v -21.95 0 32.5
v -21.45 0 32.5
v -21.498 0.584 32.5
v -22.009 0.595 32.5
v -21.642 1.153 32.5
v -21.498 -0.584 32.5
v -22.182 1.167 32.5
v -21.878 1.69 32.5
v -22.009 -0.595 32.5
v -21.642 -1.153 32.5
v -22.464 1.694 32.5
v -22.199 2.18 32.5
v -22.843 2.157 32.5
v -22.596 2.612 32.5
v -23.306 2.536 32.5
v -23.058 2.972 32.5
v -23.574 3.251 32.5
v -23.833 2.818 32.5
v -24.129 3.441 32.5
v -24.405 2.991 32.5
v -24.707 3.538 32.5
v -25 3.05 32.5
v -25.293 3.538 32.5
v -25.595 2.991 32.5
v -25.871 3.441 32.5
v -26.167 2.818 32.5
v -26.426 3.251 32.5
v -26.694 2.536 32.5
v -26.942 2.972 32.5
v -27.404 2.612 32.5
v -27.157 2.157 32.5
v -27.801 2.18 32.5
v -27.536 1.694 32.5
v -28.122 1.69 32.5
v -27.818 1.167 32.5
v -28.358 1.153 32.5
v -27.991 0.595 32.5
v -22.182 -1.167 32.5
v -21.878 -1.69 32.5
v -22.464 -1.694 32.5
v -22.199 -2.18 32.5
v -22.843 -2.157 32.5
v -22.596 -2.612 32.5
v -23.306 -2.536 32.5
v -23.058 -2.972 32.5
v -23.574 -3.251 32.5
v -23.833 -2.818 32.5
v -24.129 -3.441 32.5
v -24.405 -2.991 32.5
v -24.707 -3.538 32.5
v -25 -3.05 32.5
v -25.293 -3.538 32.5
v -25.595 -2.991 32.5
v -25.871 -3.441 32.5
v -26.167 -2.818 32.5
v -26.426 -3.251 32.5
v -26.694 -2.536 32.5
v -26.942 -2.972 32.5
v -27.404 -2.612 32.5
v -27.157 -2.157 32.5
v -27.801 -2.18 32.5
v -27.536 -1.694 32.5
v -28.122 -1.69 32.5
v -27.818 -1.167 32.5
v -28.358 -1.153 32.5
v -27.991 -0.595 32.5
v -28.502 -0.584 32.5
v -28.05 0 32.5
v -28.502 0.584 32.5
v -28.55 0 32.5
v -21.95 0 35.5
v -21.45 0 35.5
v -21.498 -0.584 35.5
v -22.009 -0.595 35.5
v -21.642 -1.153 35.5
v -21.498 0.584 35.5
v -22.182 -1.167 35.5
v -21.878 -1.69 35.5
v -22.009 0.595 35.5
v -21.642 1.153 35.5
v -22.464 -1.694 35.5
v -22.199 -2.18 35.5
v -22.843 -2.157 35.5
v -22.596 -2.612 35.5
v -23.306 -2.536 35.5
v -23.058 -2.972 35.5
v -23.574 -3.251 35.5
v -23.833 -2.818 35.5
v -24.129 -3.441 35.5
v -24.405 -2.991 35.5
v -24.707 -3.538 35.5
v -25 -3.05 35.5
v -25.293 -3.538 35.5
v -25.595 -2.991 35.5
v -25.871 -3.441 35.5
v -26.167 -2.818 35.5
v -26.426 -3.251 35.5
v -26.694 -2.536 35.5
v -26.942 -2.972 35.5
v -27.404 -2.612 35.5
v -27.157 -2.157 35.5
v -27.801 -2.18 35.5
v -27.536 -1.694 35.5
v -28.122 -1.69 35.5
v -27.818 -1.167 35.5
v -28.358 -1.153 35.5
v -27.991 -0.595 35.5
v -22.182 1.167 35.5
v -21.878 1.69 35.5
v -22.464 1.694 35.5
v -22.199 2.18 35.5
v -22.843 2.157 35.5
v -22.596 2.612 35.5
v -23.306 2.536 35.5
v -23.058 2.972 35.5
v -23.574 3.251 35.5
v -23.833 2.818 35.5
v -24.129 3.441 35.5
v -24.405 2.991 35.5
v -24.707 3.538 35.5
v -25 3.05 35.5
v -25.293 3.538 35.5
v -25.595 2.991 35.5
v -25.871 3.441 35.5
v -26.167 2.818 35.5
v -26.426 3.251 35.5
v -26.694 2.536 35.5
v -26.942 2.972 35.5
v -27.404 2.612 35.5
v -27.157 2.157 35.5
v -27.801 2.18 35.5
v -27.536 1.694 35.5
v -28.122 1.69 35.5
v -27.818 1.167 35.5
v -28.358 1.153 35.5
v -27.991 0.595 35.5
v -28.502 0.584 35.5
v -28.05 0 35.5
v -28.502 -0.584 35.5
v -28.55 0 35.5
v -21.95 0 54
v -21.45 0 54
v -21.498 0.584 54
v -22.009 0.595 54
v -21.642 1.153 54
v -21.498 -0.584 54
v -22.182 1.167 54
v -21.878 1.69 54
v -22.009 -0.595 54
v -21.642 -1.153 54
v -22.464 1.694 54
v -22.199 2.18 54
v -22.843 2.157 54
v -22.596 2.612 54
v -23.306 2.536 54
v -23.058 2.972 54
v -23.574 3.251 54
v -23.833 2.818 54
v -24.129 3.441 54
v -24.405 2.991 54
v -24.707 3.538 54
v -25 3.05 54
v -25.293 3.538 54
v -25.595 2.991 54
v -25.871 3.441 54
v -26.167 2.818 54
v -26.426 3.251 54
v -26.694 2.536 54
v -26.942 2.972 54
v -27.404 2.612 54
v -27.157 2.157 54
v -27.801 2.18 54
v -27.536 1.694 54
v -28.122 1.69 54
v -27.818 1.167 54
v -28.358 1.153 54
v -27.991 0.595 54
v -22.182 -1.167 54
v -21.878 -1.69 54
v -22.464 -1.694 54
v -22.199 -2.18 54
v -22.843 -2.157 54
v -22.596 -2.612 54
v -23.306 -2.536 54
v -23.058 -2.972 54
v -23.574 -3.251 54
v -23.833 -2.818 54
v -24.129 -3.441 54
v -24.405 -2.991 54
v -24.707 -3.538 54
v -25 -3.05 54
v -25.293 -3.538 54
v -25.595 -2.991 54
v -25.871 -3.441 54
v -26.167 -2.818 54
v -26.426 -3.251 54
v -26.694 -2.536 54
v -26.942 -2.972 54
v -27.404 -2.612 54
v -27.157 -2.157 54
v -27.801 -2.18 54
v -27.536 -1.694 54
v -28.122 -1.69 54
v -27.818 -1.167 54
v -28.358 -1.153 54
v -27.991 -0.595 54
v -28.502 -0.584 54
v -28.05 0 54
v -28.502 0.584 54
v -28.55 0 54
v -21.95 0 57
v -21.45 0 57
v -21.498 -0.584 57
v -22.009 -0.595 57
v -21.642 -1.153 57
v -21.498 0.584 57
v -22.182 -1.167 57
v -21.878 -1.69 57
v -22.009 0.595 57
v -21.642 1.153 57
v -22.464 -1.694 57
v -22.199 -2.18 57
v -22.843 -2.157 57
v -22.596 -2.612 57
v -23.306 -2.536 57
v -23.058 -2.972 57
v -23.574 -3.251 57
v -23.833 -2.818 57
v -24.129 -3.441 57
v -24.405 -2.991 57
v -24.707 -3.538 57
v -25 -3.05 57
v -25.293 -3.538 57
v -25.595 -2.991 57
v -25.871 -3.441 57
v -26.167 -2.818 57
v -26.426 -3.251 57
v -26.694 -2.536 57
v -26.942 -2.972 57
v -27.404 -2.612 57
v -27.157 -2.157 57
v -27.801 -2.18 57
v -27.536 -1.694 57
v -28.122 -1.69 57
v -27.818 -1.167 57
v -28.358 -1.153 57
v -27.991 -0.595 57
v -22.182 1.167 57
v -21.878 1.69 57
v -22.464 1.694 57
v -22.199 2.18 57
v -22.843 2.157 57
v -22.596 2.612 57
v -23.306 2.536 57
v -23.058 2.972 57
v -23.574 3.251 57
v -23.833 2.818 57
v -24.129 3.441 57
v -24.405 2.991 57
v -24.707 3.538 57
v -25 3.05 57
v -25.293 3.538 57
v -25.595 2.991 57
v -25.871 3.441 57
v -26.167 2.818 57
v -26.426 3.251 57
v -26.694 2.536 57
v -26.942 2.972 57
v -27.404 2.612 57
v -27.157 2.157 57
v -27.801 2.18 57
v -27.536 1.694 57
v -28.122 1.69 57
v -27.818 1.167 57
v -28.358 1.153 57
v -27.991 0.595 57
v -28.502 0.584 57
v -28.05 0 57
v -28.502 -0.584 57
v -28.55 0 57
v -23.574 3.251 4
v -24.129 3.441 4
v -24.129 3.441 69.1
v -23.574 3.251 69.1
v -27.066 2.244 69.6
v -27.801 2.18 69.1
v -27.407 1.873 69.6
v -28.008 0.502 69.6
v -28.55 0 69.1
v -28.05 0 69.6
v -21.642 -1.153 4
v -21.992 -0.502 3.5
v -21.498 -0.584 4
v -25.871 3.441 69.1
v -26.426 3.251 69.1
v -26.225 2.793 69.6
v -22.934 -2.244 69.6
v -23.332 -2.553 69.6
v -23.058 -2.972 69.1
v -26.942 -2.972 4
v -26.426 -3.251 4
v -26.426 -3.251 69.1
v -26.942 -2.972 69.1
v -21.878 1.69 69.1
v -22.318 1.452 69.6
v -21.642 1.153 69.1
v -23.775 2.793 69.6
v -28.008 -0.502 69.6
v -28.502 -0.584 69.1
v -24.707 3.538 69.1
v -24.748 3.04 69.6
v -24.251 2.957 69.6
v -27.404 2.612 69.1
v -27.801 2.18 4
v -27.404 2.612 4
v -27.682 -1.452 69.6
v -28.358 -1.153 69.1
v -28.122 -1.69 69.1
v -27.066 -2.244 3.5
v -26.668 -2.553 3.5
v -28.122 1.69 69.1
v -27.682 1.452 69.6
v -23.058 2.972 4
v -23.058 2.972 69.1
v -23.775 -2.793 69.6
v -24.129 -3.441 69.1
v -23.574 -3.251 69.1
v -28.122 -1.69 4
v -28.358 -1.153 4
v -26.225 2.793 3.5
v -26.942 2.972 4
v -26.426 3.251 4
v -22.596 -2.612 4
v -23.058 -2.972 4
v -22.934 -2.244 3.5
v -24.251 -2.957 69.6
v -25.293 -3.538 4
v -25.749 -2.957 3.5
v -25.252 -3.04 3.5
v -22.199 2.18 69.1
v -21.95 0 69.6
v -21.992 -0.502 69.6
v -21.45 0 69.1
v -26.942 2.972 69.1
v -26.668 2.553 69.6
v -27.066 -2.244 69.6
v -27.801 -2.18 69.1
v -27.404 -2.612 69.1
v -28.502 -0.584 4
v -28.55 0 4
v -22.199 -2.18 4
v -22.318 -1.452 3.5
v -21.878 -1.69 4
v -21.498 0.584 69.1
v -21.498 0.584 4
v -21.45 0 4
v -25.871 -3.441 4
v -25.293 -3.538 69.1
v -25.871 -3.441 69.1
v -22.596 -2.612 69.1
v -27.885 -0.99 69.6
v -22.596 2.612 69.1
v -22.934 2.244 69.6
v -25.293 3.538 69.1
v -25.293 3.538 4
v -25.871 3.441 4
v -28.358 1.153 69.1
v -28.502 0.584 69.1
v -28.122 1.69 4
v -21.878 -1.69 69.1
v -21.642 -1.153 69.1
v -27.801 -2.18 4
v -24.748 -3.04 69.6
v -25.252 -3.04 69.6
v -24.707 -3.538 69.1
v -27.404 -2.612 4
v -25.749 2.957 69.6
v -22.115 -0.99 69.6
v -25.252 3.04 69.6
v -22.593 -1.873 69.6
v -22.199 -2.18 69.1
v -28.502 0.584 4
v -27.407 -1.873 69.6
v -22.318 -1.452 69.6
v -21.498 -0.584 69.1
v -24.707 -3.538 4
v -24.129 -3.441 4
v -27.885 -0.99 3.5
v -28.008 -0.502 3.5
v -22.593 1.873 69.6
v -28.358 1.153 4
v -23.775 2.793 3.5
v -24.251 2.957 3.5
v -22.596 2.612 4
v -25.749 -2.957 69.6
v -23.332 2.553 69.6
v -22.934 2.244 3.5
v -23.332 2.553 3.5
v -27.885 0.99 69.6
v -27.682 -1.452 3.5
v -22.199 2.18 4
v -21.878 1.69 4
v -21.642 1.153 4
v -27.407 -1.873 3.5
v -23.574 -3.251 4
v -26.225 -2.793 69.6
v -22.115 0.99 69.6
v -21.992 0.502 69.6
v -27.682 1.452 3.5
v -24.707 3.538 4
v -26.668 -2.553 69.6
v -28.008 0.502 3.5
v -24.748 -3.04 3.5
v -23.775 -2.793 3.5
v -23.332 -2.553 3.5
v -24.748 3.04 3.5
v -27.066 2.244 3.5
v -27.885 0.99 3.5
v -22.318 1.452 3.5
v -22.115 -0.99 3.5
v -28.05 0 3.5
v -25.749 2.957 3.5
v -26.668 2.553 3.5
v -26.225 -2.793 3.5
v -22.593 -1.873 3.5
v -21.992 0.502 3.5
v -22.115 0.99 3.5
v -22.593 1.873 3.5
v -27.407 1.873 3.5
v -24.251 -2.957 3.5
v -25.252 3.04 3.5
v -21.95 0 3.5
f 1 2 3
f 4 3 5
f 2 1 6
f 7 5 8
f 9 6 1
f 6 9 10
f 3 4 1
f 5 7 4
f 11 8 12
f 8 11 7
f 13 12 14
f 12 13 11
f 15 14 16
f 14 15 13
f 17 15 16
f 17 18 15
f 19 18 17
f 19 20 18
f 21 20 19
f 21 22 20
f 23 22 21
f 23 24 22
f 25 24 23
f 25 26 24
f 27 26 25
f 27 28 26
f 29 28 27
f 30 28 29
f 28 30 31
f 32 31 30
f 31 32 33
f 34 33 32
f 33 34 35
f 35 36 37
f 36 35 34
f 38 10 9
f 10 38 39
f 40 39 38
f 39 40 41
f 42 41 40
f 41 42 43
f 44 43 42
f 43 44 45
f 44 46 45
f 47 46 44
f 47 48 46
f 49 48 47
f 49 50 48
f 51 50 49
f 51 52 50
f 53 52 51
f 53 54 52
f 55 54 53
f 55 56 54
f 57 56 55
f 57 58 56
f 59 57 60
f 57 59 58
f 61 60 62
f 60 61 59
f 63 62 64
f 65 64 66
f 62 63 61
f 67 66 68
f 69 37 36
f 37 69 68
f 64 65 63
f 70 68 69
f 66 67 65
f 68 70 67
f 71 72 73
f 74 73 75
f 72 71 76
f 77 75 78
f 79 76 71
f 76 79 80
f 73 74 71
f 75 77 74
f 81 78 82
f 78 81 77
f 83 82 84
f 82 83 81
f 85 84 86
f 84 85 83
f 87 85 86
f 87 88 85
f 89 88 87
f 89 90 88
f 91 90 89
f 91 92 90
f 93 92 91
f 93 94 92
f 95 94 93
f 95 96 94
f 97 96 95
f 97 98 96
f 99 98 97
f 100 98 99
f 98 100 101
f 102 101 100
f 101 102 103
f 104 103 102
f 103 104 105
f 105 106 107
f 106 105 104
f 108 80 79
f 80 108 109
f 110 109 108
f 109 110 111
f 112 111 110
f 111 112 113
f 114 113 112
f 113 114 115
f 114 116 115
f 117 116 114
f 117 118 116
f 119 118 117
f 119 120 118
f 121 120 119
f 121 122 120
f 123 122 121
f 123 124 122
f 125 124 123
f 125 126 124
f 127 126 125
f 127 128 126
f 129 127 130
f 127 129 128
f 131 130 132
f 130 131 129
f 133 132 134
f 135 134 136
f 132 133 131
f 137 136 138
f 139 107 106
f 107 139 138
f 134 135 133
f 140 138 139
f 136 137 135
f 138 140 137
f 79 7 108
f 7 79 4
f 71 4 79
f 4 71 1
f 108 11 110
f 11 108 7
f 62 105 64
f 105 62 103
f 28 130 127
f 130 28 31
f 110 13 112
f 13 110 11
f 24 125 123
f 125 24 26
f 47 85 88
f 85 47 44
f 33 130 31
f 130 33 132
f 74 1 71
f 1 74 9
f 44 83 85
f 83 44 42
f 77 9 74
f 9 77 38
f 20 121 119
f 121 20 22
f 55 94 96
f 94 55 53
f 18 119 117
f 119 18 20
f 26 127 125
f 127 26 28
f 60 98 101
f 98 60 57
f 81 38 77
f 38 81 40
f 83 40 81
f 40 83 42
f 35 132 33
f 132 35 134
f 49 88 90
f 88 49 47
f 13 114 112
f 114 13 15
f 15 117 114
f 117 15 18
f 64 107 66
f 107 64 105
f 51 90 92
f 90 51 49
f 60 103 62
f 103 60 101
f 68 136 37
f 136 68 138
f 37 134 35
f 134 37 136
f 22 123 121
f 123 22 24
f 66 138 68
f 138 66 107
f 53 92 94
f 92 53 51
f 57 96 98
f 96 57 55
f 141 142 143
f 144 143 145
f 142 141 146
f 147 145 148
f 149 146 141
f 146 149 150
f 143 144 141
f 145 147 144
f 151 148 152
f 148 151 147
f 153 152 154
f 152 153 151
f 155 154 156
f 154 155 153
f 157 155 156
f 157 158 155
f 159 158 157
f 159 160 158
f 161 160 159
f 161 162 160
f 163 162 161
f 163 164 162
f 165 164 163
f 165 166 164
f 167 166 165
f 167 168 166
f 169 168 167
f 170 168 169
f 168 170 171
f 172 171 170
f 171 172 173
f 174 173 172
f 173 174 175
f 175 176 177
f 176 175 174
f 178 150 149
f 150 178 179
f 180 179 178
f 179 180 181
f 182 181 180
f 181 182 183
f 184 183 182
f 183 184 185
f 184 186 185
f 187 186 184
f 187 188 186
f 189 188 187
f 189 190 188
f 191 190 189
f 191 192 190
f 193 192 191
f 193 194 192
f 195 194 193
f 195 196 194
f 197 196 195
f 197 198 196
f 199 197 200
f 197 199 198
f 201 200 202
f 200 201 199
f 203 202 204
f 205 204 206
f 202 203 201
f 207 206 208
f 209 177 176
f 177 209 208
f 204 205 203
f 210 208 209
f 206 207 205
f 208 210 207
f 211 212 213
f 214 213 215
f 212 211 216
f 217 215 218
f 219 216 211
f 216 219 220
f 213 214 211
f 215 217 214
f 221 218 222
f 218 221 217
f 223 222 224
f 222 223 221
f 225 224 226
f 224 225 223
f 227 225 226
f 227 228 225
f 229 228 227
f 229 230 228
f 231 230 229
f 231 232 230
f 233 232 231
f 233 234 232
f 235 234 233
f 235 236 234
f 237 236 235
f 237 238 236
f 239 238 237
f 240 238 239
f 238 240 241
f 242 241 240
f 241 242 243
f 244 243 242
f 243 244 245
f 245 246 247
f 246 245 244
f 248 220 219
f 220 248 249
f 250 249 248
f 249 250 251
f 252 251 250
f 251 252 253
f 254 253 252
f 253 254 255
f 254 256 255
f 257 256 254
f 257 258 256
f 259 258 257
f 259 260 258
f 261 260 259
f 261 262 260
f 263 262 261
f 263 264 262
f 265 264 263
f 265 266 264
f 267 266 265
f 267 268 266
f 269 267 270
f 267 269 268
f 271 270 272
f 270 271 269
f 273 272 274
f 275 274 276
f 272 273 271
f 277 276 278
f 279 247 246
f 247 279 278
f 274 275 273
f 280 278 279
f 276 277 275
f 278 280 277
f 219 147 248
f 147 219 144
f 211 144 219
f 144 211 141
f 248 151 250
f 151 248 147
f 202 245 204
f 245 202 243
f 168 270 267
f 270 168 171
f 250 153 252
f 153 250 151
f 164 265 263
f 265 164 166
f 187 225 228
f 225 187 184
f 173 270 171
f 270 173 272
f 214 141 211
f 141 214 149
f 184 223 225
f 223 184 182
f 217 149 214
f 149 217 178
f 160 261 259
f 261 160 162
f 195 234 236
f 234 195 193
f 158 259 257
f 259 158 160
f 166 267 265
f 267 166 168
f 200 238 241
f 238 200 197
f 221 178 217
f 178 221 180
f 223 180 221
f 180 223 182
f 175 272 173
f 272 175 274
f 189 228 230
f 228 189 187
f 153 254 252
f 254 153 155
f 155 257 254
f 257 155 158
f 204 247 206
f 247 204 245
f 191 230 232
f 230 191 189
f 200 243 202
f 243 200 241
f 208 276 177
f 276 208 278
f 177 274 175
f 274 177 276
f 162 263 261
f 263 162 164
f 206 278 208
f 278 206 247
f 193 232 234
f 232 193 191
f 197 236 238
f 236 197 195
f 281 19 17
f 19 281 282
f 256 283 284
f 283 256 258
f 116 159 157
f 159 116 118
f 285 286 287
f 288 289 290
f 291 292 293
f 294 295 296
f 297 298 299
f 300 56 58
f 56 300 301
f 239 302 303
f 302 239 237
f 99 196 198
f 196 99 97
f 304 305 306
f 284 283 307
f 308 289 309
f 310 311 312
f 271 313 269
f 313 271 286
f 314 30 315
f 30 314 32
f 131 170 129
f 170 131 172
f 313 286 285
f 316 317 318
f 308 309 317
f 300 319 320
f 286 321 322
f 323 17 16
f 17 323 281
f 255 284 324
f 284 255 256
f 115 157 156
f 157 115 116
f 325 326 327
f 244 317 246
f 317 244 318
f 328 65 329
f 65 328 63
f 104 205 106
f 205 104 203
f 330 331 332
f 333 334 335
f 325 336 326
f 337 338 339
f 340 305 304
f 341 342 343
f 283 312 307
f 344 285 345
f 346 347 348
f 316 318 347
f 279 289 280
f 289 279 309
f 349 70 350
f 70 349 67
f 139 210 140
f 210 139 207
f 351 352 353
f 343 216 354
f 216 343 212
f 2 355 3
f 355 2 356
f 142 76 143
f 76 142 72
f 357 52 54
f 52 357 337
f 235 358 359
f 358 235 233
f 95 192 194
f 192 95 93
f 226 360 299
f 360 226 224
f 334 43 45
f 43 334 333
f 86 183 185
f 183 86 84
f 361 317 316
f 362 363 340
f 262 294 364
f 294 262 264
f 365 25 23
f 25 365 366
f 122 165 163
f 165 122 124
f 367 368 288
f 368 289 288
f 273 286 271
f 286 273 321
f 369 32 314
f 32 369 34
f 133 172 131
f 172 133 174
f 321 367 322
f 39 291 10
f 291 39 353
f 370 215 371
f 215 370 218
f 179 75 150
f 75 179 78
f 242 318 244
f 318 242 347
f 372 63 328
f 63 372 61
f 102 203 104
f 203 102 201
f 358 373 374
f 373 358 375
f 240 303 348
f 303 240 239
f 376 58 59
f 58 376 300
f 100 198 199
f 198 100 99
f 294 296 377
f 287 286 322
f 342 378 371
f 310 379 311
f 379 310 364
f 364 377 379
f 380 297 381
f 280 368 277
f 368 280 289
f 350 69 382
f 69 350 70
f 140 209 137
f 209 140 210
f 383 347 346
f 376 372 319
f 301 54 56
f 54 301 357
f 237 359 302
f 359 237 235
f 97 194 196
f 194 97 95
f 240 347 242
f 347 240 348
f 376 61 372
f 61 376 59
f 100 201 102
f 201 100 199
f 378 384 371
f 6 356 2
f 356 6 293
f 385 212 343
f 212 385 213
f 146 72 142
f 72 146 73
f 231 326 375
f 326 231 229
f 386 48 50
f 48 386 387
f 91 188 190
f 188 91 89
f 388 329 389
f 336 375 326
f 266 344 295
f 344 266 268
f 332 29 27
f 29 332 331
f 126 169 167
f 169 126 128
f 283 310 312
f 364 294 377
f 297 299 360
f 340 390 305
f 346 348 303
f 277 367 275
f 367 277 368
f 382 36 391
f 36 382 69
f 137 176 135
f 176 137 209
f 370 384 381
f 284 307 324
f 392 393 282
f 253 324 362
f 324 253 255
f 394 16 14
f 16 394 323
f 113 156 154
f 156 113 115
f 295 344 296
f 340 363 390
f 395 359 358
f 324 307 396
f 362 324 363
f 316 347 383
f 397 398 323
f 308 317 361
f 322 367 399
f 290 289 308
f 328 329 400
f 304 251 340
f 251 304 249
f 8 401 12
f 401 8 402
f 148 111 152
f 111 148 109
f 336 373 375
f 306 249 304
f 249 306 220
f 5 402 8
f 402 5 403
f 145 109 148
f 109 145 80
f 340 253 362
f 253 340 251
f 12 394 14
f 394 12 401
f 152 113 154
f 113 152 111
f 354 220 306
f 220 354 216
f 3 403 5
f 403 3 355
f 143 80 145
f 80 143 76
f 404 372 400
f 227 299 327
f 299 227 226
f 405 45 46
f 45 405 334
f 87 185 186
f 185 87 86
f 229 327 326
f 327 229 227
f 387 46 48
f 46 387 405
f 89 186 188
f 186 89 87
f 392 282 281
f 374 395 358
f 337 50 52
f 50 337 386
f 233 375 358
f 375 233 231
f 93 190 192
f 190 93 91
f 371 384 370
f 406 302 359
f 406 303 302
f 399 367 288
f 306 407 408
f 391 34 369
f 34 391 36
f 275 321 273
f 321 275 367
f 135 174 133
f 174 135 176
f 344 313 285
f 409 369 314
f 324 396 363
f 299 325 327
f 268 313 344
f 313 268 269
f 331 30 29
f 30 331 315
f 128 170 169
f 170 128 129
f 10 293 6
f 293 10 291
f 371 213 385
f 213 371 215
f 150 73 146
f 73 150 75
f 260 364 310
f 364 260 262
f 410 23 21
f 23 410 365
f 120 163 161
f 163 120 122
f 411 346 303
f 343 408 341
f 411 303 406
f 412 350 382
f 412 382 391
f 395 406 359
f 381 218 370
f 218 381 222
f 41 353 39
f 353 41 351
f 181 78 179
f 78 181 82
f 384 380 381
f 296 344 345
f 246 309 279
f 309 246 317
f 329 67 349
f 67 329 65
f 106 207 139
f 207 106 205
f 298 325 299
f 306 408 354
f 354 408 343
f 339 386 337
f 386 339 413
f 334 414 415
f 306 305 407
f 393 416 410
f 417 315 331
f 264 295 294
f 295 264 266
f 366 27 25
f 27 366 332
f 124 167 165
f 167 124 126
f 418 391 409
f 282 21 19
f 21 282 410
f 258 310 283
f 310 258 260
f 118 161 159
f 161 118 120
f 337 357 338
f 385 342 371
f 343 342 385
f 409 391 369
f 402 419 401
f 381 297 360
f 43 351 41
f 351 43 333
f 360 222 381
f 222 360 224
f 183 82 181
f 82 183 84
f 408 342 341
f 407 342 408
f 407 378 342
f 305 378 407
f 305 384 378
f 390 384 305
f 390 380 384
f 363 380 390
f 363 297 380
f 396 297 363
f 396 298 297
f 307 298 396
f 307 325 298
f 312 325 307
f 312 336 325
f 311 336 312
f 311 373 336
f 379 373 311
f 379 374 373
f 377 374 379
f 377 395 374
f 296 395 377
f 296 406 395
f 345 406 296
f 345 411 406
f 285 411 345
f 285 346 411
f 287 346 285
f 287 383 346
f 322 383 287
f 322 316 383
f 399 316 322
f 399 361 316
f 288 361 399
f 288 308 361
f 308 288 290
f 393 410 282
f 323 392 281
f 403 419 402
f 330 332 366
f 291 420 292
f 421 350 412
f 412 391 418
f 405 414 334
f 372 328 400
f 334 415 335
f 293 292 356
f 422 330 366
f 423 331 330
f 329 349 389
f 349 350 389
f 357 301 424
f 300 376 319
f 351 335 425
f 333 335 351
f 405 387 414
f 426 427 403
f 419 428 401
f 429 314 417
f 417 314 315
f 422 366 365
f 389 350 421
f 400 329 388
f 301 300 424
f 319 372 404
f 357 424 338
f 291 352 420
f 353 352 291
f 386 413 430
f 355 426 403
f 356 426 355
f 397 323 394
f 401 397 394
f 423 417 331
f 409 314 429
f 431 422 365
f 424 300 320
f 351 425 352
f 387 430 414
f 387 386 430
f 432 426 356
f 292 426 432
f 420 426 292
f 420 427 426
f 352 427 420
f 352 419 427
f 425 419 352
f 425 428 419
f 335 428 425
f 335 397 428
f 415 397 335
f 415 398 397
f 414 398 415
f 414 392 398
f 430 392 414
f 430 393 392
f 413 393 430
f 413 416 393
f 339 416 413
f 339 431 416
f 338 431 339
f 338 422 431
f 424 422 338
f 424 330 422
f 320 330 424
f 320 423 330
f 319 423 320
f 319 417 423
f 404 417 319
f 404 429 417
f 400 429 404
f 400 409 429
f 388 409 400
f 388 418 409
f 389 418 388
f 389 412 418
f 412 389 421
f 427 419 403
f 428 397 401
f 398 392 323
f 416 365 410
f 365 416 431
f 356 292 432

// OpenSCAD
// file: ../lib/common.scad
// ============================================================================
//  Вспомогательные модули общего назначения.
//  Подключать через use <lib/common.scad> — файл не содержит параметров
//  проекта и ни от чего не зависит.
// ============================================================================

_eps = 0.01;

// --------------------------------------------------------------------- 2D ---
// Прямоугольник со скруглёнными углами, по центру
module rrect(w, d, r) {
    rr = min(r, w/2 - _eps, d/2 - _eps);
    if (rr > 0) offset(r = rr) square([w - 2*rr, d - 2*rr], center = true);
    else square([w, d], center = true);
}

// --------------------------------------------------------------------- 3D ---
// Коробка со скруглением ТОЛЬКО вертикальных рёбер: нижние и верхние острые
module rounded_box(w, d, h, r) linear_extrude(height = h) rrect(w, d, r);

// Цилиндр с фасками на торцах (снимает «слоновью ногу» и облегчает посадку)
module chamfered_cyl(d, h, ch = 0.6, bottom = true, top = true) {
    r  = d/2;
    cb = bottom ? min(ch, h/2) : 0;
    ct = top    ? min(ch, h/2) : 0;
    if (cb <= 0 && ct <= 0) cylinder(d = d, h = h);
    else rotate_extrude(angle = 360) polygon(concat(
        [[0, 0]],
        cb > 0 ? [[r - cb, 0], [r, cb]] : [[r, 0]],
        ct > 0 ? [[r, h - ct], [r - ct, h]] : [[r, h]],
        [[0, h]]));
}

// Труба
module tube(od, id, h) difference() {
    cylinder(d = od, h = h);
    translate([0, 0, -_eps]) cylinder(d = id, h = h + 2*_eps);
}

// Сквозное отверстие, растянутое вверх-вниз для гарантированного вычитания
module thru(d, h) translate([0, 0, -_eps]) cylinder(d = d, h = h + 2*_eps);

// Потайное отверстие под саморез с конической головкой.
// Пластина занимает z = [0 .. t], головка утапливается сверху,
// саморез идёт вниз (в ответную стойку).
module countersunk_hole(free_d, head_d, t, down = 30) {
    cone_h = (head_d - free_d)/2;    // головка 90 градусов
    union() {
        translate([0, 0, -down]) cylinder(d = free_d, h = down + t - cone_h + _eps);
        translate([0, 0, t - cone_h]) cylinder(d1 = free_d, d2 = head_d, h = cone_h);
    }
}

// Паз (щелевое отверстие) длиной len по X, сквозной по высоте h
module slot(len, d, h) hull() for (s = [-1, 1])
    translate([s*(len - d)/2, 0, 0]) cylinder(d = d, h = h);

// Стойка под саморез: цилиндр с пилотным отверстием сверху.
// Снизу фаски нет — стойка растёт из дна детали.
module screw_boss(od, h, pilot_d, pilot_depth, ch = 0.6) difference() {
    chamfered_cyl(od, h, ch = ch, bottom = false, top = true);
    translate([0, 0, h - pilot_depth]) cylinder(d = pilot_d, h = pilot_depth + _eps);
}

// Треугольная косынка в плоскости XZ (катеты l по X и h по Z), толщина t по Y
module gusset(l, h, t) translate([0, -t/2, 0]) linear_extrude(height = t)
    polygon([[0, 0], [l, 0], [0, h]]);

// Конусное гнездо под заточенный винт-ось (ось Z вниз от z=0)
module cone_seat(d, depth) translate([0, 0, -depth])
    cylinder(d1 = 0.2, d2 = d, h = depth + _eps);

// Канавка под круглый пассик: тор, вычитаемый из обода
module belt_groove(pulley_d, groove_r) rotate_extrude(angle = 360)
    translate([pulley_d/2, 0]) circle(r = groove_r);

// Сетка облегчающих отверстий по кругу
module radial_holes(n, r, d, h) for (i = [0 : n - 1])
    rotate([0, 0, i*360/n]) translate([r, 0, 0]) thru(d, h);
// main file
// ============================================================================
//  ВАЛ (шпиндель)
//
//  Диаметр 7.1 мм выбран не случайно: это же и центрирующий штырь под
//  отверстие пластинки, поэтому вал проходит сквозь диск и выступает над
//  пластинкой. Две кольцевые канавки — под стопорные винты колеса и диска;
//  канавка (а не лыска) не требует определённого поворота вала и заодно
//  держит деталь по высоте.
//
//  Печать: стоя, торцом на стол, 100% заполнение, минимальная скорость.
//  Это расходная деталь прототипа: как только всё поедет — заменить
//  отрезком шлифованного стального прутка (тогда spindle_d = 8).
// ============================================================================

include <../params.scad>
use <../lib/common.scad>

module spindle() {
    translate([platter_pos[0], platter_pos[1], spindle_bottom_z]) difference() {
        chamfered_cyl(spindle_d, spindle_len, ch = 0.5);
        // кольцевые канавки под стопорные винты
        for (z = spindle_set_z)
            translate([0, 0, z - spindle_bottom_z]) difference() {
                cylinder(d = spindle_d + 2, h = spindle_groove_h, center = true);
                cylinder(d = spindle_d - 2*spindle_groove_depth,
                         h = spindle_groove_h + 2*eps, center = true);
            }
    }
}

spindle();
